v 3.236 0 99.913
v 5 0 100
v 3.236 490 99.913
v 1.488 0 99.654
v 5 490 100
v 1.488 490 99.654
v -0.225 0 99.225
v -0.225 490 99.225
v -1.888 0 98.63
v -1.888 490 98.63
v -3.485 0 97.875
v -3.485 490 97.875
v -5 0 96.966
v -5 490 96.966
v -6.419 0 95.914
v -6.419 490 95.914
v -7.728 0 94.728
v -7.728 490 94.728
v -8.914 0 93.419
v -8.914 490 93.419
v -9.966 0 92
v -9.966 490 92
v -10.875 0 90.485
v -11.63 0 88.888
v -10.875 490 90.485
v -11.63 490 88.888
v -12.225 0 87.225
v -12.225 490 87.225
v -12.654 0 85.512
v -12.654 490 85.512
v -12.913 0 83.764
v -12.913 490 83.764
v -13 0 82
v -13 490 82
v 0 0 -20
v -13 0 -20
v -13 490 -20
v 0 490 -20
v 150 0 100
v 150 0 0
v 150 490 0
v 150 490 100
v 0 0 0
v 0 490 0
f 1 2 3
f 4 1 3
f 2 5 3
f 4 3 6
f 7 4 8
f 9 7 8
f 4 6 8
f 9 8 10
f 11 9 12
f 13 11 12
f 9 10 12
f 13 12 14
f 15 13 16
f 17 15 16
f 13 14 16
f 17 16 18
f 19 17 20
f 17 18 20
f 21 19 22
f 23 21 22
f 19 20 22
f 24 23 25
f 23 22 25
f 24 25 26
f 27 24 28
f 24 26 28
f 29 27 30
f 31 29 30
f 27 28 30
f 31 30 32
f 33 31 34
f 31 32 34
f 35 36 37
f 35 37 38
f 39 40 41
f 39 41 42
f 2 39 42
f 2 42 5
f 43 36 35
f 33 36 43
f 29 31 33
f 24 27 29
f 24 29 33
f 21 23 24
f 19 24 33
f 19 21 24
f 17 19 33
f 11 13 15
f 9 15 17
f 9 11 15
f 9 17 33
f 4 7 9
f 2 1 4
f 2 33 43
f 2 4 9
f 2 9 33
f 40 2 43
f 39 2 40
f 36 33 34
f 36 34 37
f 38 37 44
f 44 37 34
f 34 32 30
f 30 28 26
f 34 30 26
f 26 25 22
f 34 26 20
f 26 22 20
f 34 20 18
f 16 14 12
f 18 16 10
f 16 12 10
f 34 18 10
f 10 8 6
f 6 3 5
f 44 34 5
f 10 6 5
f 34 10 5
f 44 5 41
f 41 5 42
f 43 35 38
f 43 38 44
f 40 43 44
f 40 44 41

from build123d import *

# Parameters (mm, degrees)
PAD_DEPTH = 490
FILLET_R  = 18


with BuildPart() as part:
    # Sketch → Pad (new body)
    with BuildSketch(Plane.XZ):
        Polygon((0, 0), (150, 0), (150, 100), (0, 100), (-13, 100), (-13, -20), (0, -20), align=None)
    extrude(amount=-PAD_DEPTH)

    # Fillet
    fillet_edges = [part.edges().sort_by_distance(p)[0] for p in [
        (-13, 245, 100),
    ]]
    fillet(fillet_edges, radius=FILLET_R)


solid = part.part
